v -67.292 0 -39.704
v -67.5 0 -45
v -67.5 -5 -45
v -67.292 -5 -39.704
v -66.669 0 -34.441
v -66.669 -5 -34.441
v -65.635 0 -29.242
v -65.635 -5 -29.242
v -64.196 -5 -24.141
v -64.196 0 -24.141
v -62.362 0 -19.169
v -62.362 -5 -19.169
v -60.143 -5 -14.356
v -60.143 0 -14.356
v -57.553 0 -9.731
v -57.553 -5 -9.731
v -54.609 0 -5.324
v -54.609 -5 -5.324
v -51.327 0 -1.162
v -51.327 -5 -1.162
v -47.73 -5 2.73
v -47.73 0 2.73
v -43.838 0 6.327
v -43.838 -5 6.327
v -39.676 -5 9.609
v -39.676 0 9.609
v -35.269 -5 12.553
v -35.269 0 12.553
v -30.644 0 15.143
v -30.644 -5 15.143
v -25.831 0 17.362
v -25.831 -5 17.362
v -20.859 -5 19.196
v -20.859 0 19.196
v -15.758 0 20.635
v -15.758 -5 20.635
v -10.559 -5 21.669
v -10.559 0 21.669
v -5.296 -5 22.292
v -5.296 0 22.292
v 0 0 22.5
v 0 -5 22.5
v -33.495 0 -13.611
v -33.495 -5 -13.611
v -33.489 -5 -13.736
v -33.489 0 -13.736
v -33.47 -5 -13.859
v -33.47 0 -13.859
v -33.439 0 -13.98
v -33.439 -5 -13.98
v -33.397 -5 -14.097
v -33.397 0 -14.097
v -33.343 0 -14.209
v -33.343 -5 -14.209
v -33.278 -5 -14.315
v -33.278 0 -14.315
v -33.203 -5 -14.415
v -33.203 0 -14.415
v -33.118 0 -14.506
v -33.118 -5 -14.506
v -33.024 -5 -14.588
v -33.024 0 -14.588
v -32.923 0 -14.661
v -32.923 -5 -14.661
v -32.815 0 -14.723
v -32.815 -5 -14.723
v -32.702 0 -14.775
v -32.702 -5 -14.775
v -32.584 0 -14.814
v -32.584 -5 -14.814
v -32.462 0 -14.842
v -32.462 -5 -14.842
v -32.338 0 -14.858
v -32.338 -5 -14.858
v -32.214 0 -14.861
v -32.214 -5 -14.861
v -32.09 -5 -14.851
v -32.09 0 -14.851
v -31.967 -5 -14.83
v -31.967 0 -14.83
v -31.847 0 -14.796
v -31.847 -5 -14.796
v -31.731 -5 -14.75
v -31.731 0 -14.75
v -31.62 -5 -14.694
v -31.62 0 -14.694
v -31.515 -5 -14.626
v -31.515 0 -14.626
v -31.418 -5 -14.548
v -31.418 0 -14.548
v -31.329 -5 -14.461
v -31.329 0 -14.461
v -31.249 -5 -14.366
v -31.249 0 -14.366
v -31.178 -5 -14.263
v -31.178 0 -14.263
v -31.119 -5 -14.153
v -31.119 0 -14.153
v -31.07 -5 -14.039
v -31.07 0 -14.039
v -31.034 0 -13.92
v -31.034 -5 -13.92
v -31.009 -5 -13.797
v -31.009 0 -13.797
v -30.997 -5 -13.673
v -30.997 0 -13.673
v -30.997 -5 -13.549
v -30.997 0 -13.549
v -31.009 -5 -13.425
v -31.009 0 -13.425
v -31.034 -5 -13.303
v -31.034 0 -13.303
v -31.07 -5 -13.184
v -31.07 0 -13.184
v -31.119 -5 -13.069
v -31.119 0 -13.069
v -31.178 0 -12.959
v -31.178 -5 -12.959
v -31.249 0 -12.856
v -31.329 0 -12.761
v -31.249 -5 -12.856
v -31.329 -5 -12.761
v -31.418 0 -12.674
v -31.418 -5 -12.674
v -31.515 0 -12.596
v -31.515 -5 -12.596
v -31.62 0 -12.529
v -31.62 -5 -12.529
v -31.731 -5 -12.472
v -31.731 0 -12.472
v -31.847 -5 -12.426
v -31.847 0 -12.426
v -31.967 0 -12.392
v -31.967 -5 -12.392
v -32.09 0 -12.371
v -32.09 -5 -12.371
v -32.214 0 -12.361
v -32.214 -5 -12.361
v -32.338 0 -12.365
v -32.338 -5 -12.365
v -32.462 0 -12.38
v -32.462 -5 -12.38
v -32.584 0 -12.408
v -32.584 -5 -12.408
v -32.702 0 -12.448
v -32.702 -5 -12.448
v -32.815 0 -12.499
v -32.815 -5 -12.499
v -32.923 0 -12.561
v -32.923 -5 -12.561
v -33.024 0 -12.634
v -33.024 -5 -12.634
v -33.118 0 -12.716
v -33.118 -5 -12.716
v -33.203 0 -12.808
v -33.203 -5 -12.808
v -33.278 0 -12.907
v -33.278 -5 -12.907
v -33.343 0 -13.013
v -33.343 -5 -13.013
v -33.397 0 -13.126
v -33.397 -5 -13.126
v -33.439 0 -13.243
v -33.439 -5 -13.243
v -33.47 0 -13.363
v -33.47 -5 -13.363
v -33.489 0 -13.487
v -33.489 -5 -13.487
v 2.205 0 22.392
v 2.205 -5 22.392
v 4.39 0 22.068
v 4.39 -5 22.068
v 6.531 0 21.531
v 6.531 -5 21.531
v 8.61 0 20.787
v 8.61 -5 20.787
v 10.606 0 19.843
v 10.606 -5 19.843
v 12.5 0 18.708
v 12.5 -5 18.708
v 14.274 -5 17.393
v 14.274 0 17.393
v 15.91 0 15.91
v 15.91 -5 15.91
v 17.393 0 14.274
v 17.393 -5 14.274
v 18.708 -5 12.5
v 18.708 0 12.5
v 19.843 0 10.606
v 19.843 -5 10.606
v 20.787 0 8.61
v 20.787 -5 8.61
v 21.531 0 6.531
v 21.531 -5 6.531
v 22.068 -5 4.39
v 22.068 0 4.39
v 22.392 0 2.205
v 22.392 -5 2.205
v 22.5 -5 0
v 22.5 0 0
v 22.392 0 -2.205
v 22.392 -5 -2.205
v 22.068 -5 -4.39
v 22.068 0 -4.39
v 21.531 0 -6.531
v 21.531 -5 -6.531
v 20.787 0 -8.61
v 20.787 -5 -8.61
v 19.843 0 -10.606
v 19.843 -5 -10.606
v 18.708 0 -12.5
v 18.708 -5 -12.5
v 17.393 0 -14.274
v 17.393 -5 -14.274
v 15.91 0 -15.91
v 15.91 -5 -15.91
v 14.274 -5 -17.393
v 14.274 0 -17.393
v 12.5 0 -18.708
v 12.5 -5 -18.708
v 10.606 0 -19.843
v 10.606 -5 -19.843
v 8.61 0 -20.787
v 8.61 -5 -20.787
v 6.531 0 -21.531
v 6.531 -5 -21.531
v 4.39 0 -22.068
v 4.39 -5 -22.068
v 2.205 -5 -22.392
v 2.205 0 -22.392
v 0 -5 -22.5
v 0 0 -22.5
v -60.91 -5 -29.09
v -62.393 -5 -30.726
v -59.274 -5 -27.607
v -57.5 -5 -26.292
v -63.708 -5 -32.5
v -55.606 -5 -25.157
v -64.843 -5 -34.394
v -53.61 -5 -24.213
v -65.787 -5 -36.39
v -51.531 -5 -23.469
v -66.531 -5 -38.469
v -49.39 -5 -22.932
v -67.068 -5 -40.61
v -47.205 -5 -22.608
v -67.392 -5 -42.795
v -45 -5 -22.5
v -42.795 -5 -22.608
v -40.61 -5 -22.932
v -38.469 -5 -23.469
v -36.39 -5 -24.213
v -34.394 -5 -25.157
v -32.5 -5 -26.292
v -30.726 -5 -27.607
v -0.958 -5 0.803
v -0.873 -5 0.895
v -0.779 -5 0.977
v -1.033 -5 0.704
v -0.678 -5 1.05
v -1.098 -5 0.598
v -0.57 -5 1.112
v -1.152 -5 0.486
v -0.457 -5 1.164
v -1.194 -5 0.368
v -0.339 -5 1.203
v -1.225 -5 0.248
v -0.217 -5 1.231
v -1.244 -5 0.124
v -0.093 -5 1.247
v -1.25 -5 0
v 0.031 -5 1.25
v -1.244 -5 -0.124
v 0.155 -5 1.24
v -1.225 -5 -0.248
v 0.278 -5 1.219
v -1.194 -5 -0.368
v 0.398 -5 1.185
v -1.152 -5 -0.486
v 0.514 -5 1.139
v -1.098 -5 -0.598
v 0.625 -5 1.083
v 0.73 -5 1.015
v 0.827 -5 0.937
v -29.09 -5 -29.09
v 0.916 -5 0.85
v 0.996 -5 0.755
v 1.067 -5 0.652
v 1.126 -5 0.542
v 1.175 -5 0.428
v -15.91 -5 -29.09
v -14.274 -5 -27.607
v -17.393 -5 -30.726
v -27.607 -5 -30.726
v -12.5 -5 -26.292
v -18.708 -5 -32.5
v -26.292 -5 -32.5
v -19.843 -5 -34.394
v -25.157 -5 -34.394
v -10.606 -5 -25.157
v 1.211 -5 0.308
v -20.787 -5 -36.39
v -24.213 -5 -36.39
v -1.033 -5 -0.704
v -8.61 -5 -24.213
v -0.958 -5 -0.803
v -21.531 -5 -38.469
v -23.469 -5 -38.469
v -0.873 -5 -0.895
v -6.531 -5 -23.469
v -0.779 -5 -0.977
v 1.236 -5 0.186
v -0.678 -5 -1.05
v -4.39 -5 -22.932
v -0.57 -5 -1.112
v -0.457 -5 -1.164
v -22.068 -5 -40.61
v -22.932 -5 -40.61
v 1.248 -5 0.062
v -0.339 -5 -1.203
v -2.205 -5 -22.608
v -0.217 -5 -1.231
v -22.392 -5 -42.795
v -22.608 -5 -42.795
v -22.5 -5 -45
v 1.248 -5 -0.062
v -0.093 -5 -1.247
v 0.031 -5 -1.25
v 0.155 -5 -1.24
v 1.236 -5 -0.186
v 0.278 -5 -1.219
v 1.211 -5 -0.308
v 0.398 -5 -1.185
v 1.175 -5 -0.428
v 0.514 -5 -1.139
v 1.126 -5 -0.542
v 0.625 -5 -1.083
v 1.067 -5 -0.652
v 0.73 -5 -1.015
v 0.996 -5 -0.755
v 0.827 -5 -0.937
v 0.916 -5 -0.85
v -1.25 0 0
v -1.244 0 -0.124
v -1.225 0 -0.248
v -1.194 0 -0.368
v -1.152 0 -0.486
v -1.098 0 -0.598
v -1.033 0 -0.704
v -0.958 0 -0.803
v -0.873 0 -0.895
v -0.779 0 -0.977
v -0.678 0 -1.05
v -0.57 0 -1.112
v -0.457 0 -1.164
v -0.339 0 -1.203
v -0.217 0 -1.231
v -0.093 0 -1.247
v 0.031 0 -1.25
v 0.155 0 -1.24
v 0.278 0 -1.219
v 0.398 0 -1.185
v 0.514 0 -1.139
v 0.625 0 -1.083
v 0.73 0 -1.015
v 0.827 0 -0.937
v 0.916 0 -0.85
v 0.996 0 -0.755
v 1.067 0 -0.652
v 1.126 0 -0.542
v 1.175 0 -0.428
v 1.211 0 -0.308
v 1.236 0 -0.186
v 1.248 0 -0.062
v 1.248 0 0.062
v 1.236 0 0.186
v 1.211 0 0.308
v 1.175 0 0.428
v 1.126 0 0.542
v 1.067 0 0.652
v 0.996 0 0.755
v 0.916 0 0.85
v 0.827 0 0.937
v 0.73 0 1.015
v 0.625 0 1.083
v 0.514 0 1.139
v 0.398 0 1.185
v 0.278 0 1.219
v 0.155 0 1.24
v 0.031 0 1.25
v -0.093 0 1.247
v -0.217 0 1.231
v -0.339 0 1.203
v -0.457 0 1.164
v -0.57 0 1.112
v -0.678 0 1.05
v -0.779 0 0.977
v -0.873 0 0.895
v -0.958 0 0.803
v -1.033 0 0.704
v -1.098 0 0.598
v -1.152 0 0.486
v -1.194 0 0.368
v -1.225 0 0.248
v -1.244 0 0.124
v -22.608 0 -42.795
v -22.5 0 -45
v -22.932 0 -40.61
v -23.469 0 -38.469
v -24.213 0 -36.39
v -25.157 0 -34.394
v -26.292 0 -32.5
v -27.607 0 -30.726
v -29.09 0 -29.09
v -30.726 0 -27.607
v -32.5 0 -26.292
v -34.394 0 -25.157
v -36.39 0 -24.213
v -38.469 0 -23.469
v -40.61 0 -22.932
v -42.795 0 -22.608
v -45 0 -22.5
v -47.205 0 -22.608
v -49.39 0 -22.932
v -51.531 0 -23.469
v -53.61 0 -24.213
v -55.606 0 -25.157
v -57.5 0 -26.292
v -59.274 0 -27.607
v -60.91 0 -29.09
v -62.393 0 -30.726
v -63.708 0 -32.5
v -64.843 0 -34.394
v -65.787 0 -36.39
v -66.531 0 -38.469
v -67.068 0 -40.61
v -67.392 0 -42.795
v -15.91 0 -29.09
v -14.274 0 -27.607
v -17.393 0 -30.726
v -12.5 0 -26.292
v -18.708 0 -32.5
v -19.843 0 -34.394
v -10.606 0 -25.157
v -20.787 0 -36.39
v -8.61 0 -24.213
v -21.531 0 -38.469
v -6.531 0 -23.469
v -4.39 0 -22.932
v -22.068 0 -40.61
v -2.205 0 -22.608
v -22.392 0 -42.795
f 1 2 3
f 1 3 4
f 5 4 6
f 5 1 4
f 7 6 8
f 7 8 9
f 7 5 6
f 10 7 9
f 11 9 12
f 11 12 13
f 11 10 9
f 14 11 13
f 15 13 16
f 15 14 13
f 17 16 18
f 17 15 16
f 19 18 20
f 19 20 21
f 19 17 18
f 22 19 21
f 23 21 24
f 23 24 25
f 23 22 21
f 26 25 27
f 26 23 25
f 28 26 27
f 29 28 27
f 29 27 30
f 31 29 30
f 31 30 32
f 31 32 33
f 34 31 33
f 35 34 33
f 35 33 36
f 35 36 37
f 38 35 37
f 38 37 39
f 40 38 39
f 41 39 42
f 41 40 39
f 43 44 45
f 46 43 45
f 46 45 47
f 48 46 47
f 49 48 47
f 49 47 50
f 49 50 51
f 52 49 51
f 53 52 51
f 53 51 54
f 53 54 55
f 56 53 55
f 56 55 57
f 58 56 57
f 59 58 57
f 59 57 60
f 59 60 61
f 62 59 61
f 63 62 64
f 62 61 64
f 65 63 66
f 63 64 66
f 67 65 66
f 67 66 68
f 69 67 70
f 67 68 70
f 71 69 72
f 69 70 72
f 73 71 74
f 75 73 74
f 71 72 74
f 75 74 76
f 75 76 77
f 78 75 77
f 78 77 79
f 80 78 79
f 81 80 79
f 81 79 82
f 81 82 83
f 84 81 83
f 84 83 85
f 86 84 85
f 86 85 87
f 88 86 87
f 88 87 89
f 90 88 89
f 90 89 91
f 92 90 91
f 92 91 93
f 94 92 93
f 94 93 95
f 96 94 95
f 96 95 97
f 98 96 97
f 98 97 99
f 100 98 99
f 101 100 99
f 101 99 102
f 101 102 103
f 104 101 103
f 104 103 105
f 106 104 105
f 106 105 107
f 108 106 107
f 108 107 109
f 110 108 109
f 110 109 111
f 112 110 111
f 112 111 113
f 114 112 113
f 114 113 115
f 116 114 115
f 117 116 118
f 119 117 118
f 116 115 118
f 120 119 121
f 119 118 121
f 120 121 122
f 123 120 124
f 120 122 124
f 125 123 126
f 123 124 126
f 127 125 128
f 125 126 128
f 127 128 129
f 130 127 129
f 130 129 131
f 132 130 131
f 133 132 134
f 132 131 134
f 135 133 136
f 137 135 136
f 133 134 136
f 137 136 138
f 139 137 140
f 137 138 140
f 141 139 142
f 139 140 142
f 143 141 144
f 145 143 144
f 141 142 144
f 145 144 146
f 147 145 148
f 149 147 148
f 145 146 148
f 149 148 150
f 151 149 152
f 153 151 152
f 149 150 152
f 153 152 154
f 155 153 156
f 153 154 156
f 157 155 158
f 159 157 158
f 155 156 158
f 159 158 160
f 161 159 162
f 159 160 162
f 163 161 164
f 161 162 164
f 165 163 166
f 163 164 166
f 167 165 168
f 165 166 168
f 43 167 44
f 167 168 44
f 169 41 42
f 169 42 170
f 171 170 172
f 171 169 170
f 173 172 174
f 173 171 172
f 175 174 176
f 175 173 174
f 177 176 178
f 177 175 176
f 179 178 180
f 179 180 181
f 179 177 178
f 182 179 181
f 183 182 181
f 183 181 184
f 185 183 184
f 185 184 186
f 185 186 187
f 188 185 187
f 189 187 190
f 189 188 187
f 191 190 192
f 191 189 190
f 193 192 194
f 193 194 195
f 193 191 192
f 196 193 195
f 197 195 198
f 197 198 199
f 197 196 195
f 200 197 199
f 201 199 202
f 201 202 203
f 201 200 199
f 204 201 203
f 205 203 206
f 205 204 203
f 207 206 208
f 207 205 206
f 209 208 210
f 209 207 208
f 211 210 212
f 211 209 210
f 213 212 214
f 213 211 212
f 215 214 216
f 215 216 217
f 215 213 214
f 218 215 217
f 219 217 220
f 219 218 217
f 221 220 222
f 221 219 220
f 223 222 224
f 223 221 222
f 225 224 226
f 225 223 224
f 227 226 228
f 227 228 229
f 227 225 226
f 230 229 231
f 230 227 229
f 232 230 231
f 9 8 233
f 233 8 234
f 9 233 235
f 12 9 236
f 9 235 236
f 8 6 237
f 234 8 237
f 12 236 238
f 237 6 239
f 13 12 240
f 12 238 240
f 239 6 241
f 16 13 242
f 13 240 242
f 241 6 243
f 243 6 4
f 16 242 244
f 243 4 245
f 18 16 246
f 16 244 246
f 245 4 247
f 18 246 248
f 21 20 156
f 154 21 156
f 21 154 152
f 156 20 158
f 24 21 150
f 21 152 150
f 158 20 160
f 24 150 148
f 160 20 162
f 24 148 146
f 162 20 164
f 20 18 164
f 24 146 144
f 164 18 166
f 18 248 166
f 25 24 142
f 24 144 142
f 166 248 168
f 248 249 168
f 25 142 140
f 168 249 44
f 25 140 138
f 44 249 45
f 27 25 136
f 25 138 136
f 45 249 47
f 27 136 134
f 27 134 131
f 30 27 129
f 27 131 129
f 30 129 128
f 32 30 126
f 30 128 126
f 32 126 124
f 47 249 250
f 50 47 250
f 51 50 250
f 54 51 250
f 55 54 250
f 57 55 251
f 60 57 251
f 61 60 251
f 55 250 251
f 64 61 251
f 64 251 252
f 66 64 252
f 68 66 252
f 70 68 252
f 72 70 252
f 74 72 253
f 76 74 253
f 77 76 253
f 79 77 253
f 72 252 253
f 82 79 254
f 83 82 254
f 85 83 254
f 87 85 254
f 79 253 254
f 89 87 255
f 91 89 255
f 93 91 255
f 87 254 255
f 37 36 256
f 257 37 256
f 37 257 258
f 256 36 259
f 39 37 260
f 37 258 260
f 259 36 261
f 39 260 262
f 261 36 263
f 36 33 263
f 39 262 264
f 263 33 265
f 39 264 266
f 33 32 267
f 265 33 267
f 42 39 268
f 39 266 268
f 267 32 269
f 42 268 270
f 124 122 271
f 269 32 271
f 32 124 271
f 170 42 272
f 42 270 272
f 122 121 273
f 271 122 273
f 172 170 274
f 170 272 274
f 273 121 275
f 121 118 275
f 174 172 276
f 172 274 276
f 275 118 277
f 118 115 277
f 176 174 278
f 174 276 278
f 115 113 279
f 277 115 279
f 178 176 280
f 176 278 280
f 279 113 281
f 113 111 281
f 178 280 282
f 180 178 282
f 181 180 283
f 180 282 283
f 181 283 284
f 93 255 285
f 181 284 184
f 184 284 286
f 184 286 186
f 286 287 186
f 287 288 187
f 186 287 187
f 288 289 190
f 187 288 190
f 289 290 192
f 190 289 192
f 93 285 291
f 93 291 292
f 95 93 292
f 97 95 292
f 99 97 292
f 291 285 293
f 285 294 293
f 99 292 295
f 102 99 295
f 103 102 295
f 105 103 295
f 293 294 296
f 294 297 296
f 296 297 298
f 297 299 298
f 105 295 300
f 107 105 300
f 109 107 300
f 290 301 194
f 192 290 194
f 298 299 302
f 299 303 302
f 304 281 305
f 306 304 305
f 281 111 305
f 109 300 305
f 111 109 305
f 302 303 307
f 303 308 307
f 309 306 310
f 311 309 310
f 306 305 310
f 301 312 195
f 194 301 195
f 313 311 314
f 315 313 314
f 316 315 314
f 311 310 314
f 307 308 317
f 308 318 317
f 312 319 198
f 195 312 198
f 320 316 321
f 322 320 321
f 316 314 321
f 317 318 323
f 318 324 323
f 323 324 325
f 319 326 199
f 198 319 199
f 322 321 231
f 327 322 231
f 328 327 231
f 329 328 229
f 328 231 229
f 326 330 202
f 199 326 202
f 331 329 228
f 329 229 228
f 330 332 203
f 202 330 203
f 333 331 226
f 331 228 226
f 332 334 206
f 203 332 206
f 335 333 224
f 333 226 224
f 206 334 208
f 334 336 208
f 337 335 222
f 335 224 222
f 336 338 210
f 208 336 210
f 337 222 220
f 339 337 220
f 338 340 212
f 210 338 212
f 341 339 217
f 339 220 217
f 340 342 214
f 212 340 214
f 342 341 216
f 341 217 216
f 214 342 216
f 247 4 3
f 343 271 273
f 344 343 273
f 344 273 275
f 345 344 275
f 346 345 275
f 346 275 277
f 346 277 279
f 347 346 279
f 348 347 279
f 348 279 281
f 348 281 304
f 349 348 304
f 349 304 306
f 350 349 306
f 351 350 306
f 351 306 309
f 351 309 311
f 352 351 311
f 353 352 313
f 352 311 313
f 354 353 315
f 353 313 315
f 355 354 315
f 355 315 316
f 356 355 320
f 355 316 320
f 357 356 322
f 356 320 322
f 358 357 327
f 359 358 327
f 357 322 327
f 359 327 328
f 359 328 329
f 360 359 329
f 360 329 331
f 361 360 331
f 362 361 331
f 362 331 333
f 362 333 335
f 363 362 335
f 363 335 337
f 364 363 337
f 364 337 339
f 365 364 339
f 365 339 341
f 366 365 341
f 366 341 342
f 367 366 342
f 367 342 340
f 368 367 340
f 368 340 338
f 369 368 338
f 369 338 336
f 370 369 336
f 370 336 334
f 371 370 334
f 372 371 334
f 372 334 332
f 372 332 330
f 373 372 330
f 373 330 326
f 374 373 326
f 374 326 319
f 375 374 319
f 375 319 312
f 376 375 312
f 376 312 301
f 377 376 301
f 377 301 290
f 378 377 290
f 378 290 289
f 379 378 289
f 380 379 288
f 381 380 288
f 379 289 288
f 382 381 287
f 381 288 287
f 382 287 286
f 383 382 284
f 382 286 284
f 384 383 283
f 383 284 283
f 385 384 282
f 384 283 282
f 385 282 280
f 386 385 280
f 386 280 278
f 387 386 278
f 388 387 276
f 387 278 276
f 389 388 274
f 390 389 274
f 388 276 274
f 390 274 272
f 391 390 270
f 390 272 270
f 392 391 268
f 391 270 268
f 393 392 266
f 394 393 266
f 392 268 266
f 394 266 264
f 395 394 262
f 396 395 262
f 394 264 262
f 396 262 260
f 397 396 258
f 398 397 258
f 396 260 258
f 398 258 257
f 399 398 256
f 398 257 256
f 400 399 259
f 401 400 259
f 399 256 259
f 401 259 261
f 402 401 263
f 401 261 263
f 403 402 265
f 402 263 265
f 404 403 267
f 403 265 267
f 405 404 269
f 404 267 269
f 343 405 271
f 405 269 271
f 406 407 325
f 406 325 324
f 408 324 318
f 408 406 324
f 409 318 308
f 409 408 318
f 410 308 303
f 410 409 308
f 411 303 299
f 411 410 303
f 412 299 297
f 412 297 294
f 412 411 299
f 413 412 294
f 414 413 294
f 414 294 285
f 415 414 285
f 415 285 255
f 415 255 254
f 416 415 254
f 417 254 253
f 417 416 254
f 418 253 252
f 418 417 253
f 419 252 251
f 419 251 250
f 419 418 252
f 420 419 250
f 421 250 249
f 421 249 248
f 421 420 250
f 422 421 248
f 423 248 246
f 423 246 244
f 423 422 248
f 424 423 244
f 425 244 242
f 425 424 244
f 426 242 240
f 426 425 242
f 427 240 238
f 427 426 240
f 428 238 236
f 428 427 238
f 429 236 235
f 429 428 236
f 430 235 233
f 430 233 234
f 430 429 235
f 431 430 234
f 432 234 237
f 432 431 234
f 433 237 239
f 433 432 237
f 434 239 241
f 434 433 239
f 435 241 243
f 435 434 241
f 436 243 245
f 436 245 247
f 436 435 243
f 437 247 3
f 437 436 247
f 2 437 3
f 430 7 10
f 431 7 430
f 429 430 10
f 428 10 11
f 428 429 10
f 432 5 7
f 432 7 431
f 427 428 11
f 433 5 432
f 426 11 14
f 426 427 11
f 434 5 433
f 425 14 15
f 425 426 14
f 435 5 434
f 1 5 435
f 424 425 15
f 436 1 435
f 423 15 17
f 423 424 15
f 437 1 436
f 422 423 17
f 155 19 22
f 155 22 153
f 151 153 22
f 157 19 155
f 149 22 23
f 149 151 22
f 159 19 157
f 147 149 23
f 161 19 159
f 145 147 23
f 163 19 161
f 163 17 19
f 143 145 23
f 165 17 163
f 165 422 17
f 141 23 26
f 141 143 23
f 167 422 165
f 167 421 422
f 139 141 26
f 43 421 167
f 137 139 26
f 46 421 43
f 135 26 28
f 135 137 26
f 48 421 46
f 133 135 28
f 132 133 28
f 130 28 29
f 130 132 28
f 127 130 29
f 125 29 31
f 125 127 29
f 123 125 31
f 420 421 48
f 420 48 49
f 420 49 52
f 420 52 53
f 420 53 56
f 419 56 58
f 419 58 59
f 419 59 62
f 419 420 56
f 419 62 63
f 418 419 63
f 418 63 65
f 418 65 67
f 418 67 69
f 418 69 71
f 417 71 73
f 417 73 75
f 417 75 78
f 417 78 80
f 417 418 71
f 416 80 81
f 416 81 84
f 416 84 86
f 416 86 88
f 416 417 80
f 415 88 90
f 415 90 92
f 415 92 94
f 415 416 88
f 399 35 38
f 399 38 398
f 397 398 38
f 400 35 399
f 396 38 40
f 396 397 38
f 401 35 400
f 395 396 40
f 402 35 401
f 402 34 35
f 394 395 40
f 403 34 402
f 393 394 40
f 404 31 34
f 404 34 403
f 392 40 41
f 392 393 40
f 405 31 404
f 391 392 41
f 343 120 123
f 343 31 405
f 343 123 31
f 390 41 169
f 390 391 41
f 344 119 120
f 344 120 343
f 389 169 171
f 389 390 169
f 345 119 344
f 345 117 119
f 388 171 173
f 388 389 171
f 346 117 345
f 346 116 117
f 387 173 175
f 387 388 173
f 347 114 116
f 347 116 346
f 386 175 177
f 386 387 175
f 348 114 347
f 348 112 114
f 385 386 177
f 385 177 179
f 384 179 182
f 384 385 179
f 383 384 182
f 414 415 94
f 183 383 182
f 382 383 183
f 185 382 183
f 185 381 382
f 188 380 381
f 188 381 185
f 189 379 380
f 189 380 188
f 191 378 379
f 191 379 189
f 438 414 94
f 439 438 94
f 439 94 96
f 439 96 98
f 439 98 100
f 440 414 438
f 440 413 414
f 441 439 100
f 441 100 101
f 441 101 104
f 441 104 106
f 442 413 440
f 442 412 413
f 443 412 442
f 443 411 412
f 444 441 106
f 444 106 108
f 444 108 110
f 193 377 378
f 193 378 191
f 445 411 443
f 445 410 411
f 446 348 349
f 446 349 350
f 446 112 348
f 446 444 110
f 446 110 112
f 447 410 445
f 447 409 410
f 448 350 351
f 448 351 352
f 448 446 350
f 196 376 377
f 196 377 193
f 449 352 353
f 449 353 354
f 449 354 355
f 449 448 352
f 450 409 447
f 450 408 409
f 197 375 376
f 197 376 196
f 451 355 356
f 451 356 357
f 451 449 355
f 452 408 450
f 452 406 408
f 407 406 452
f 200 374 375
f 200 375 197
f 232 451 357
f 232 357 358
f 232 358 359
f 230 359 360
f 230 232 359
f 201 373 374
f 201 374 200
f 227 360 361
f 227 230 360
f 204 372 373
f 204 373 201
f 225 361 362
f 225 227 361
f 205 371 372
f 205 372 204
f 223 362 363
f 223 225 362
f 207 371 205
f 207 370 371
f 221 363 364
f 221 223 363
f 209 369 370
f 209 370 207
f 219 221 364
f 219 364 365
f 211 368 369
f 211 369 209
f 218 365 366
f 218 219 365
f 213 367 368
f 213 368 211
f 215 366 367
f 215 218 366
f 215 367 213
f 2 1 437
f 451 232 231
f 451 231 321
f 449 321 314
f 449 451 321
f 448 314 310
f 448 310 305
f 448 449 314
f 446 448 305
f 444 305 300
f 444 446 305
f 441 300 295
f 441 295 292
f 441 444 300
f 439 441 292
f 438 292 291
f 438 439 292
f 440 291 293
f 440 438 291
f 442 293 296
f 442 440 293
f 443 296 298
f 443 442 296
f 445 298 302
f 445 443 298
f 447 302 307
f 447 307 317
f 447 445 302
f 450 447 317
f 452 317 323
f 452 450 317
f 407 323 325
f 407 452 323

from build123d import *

# Parameters (mm, degrees)
EXTRUDE_1_DEPTH    = 5
HOLE_WIZARD_M3_1_D = 2.5


with BuildPart() as part:
    # 草圖1 → 填料-伸長1 (new body)
    with BuildSketch(Plane(origin=(0, 0, 0), x_dir=(1, 0, 0), z_dir=(0, 1, 0))):
        with BuildLine():
            ThreePointArc((-67.5, 45), (-47.72970773, -2.72970773), (0, -22.5))
            ThreePointArc((0, -22.5), (22.5, 0), (0, 22.5))
            ThreePointArc((0, 22.5), (-15.909902577, 29.090097423), (-22.5, 45))
            ThreePointArc((-22.5, 45), (-45, 22.5), (-67.5, 45))
        make_face()
    extrude(amount=-EXTRUDE_1_DEPTH)

    # M3 螺紋孔1 (through all)
    with Locations(Plane(origin=(0, 0, 0), x_dir=(1, 0, 0), z_dir=(0, 1, 0))):
        with Locations((-32.24496324, 13.611111111), (0, 0)):
            Hole(HOLE_WIZARD_M3_1_D / 2)


solid = part.part
